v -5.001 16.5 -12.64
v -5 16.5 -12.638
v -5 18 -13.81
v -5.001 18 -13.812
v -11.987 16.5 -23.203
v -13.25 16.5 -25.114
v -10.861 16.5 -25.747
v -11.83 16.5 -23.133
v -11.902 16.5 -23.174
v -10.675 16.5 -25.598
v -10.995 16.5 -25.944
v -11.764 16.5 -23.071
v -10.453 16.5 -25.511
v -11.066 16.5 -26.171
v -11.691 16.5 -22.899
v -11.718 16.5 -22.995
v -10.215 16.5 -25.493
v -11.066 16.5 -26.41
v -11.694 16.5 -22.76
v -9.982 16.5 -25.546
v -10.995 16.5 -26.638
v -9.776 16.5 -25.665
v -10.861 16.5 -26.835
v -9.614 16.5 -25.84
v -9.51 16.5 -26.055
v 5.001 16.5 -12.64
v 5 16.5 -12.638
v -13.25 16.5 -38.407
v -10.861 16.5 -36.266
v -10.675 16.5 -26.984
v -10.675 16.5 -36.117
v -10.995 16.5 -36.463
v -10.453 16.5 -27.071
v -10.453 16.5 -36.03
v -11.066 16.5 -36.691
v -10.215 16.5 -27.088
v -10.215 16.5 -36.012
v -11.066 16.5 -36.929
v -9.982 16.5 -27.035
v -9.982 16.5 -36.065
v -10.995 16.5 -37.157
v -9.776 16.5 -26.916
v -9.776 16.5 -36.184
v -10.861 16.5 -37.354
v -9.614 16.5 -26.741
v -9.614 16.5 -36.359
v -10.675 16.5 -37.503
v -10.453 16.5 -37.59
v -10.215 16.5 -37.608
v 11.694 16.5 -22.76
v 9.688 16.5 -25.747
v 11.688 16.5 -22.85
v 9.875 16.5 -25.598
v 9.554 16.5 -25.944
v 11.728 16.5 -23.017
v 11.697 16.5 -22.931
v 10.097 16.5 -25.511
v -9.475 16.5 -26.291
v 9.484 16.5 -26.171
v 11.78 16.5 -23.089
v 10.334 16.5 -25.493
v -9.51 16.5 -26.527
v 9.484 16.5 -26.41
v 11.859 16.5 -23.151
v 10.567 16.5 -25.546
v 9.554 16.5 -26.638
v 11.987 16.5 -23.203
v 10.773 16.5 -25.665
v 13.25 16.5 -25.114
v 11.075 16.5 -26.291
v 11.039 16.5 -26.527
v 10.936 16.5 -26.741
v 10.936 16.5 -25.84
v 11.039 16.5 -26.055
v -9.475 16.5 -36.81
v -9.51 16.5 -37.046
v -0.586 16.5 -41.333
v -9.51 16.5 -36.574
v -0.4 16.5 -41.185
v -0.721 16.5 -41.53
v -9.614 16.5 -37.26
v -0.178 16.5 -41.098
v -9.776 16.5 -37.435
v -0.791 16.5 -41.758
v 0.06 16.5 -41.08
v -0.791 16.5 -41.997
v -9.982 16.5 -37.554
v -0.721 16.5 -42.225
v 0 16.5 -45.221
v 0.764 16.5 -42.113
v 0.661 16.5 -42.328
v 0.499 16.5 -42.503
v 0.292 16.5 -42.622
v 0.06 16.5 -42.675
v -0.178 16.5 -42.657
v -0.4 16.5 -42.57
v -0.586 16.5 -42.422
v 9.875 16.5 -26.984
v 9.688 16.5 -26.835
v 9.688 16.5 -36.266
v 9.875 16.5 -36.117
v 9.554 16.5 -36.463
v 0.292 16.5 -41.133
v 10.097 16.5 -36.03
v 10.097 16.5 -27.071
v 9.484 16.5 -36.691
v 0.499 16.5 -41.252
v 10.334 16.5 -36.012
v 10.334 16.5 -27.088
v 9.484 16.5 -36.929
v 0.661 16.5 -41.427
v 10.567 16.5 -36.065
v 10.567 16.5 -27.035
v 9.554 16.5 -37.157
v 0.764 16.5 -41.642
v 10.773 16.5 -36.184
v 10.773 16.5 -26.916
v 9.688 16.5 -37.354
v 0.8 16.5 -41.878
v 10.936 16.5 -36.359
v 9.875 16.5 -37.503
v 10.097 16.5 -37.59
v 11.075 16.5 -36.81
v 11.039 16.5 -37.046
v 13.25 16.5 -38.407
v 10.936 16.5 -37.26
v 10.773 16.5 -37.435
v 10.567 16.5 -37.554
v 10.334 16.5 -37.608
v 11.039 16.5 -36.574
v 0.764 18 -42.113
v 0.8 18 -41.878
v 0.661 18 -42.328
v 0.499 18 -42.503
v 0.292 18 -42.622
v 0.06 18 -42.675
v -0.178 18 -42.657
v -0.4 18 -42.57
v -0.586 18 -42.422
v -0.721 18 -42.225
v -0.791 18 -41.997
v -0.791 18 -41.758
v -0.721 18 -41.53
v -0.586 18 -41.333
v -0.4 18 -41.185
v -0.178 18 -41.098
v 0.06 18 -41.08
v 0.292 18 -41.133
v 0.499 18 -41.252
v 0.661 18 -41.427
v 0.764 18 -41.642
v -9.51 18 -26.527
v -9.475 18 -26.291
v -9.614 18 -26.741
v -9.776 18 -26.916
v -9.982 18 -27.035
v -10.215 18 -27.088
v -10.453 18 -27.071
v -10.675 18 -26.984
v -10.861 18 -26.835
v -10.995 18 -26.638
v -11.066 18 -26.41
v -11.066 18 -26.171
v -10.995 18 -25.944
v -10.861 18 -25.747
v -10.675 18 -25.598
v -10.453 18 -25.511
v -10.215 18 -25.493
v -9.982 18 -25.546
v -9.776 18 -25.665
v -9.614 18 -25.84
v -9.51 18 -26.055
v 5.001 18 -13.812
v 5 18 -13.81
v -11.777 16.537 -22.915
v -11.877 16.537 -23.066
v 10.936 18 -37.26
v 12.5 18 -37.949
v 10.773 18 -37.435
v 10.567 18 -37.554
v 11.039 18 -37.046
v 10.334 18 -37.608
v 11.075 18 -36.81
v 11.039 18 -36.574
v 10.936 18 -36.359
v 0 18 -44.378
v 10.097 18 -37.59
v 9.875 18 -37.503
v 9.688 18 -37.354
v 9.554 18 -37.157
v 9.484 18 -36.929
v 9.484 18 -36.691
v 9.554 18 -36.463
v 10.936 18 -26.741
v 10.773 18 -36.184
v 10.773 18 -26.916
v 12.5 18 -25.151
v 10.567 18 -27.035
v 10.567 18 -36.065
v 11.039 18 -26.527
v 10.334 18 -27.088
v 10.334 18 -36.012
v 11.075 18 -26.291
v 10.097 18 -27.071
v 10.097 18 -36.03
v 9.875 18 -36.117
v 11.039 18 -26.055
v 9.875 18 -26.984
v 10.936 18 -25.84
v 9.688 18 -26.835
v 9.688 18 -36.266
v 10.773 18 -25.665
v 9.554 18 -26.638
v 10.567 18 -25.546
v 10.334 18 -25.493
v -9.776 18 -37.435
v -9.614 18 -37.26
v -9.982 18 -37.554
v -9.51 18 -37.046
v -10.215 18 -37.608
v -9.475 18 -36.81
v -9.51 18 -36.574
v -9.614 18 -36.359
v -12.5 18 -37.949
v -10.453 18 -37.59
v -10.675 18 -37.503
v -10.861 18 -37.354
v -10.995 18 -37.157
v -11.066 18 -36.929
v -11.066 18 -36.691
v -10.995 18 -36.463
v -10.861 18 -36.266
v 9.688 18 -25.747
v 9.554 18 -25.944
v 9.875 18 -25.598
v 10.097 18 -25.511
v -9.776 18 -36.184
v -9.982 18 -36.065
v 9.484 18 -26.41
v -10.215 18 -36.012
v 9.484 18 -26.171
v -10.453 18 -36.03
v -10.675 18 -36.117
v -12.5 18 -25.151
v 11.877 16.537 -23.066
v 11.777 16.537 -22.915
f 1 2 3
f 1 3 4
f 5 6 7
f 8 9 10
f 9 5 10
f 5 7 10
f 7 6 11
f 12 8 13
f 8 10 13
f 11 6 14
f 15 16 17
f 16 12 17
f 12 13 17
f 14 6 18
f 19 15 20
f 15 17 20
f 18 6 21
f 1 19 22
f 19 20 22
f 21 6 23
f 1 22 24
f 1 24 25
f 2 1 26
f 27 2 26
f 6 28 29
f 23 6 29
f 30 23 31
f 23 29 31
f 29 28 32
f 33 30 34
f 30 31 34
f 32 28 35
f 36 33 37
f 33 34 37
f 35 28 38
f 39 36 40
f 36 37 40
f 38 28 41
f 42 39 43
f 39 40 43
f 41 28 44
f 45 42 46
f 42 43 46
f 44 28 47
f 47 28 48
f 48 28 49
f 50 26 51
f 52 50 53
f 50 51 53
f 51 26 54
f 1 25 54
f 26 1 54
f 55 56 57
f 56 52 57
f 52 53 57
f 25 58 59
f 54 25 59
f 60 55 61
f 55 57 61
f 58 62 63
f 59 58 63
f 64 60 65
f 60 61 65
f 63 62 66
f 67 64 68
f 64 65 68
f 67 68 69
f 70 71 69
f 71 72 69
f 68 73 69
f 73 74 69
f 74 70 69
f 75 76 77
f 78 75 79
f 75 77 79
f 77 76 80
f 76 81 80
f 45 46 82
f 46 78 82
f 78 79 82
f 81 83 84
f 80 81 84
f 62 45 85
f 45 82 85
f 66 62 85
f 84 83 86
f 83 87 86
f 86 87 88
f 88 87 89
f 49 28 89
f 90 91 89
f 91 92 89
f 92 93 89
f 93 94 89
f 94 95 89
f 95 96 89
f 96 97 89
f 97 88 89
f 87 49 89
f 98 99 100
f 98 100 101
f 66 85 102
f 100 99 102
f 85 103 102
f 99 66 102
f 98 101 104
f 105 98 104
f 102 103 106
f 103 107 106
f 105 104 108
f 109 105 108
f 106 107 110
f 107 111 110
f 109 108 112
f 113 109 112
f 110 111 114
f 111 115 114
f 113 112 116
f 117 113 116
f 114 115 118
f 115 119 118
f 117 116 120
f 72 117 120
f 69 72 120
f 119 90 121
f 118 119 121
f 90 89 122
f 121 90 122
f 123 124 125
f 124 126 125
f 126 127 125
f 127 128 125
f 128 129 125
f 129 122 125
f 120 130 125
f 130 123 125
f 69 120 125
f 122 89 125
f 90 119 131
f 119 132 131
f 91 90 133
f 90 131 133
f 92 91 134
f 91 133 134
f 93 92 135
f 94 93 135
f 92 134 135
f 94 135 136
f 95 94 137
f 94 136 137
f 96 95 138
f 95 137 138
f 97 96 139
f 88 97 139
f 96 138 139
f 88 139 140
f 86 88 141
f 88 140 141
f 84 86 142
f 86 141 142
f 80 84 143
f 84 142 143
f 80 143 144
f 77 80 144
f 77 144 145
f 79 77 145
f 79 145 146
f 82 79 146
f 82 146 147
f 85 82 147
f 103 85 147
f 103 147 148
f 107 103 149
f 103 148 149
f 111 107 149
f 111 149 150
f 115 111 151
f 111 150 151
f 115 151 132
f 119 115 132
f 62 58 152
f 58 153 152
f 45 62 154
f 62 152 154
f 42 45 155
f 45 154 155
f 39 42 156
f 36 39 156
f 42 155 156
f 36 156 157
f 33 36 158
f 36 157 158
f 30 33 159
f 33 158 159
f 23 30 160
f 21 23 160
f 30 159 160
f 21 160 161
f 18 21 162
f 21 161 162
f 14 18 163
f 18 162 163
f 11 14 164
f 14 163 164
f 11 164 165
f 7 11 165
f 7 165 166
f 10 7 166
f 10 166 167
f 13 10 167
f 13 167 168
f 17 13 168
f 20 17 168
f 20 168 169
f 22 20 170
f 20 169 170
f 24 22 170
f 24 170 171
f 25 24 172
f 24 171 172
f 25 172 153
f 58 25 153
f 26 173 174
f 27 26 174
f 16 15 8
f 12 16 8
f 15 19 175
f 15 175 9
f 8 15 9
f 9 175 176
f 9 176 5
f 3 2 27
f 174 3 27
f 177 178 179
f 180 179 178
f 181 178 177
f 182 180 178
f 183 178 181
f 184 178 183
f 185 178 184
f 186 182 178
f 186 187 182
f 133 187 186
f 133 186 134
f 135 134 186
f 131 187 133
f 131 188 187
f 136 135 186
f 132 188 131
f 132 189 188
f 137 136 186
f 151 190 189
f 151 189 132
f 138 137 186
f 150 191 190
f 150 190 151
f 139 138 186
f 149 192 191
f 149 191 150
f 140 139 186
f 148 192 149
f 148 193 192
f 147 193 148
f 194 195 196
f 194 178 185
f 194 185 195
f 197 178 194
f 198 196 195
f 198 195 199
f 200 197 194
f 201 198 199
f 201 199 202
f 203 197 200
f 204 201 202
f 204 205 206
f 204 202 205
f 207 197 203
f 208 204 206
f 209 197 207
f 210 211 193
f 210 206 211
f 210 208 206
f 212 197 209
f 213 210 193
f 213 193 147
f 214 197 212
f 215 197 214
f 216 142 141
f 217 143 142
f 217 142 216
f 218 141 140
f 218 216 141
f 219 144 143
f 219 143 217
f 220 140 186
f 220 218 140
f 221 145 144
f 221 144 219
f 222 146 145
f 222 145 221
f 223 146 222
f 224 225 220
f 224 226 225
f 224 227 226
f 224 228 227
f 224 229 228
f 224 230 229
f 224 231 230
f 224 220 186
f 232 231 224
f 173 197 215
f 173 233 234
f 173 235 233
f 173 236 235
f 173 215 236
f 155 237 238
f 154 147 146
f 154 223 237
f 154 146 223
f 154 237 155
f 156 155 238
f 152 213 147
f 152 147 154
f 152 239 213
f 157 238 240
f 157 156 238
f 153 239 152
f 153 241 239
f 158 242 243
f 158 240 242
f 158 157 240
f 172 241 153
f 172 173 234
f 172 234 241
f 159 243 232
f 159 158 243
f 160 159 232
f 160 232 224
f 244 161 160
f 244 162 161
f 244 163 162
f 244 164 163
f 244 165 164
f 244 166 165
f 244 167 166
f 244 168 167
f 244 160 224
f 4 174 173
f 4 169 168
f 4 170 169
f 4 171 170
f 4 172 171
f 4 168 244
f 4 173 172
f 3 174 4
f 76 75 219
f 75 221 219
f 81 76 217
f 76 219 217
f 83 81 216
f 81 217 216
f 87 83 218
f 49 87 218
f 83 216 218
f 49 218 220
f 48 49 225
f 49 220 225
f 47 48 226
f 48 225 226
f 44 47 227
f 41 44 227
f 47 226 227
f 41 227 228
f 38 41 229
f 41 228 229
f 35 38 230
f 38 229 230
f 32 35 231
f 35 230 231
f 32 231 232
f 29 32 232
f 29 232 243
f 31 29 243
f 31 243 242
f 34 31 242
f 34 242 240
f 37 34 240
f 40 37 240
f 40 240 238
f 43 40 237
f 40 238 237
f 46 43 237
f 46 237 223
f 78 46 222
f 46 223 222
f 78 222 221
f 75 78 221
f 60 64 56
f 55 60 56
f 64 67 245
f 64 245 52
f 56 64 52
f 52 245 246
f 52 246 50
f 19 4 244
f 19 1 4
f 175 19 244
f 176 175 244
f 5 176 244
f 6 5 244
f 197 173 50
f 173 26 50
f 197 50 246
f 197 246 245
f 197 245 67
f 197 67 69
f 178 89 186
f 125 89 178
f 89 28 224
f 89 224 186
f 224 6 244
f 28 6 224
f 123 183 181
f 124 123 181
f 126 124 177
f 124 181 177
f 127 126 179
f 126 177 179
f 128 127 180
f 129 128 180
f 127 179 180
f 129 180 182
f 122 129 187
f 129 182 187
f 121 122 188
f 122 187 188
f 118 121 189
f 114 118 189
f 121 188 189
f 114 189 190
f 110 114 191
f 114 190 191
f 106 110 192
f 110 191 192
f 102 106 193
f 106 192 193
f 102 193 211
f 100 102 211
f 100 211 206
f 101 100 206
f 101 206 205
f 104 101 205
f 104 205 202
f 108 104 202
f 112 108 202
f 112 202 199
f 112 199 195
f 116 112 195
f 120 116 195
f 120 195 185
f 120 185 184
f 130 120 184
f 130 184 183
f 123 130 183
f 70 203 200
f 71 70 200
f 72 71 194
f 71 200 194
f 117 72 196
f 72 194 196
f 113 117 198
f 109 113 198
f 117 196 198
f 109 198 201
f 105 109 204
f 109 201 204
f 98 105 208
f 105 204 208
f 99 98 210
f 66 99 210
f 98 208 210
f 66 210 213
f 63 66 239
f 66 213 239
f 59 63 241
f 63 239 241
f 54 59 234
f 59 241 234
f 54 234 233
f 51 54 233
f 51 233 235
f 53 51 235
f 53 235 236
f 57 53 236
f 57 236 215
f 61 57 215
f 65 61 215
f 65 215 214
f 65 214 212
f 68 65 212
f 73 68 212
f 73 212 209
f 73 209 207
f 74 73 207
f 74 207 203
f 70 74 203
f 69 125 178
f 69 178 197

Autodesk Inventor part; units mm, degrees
sketch "スケッチ1" plane through (0, 0, 0) normal (0, 1, 0) x (-1, 0, 0)
  line L0 (-17.5, -21) -> (0, 0)
  line L1 (0, 0) -> (17.5, -21)
  line L2 (17.5, -21) -> (17.5, -41)
  line L3 (17.5, -41) -> (0, -50)
  line L4 (0, -50) -> (-17.5, -41)
  line L5 (-17.5, -41) -> (-17.5, -21)
  line L6 (0, -60) -> (0, 10) projected
  line L7 (24.5, 0) -> (-24.5, 0) projected
  dimension "d0" = 50
  dimension "d12" = 35
  dimension "d13" = 20
  dimension "d14" = 21
extrude "押し出し1" add sketch "スケッチ1" along normal blind 18
chamfer "面取り1" distance 5 distance2 10 6 edges at (8.75, 18, -10.5) (17.5, 18, -31) (8.75, 18, -45.5) (-8.75, 18, -45.5) (-17.5, 18, -31) (-8.75, 18, -10.5) measured on face at (0, 18, -30.6667)
extrude "押し出し2" add sketch "スケッチ1" against normal blind 5
ref_plane "作業平面1" through (0, 8, 0) normal (0, -0.7881, 0.6155) x (1, 0, 0)
sketch "スケッチ2" plane through (0, 8, 0) normal (0, -0.7881, 0.6155) x (1, 0, 0)
  line L0 (0, 0) -> (17.5, -16.5503) projected
  line L1 (-17.5, -16.5503) -> (0, 0) projected
  line L2 (-5, -4.7287) -> (-5, -4.7287)
  line L3 (-5, -4.7287) -> (5, -4.7287)
  line L4 (13.3346, -12.611) -> (5, -4.7287)
  line L5 (-5, -4.7287) -> (-23.6413, -26.9446)
  line L6 (5, -4.7287) -> (18.7173, -21.0763)
  line L7 (-23.6413, -26.9446) -> (-26.2109, -24.7885)
  line L8 (-26.2109, -24.7885) -> (-17.5, -16.5503)
  line L9 (17.5, -16.5503) -> (23.8178, -21.8516)
  line L10 (23.8178, -21.8516) -> (18.7173, -21.0763)
  point P0 (0, -4.9243)
  dimension "d9" = 10
  dimension "d25" = 130
  dimension "d26" = 130
extrude "押し出し3" cut sketch "スケッチ2" against normal through all
chamfer "面取り2" distance 2 distance2 8 6 edges at (-8.75, -5, -10.5) (-17.5, -5, -31) (-8.75, -5, -45.5) (8.75, -5, -45.5) (17.5, -5, -31) (8.75, -5, -10.5) measured on face at (0, -5, -30.6667)
sketch "スケッチ3" plane through (0, -5, 0) normal (0, -1, 0) x (1, 0, 0)
  line L0 (0, -3.1241) -> (15.5, -21.7241) projected
  line L1 (-15.5, -21.7241) -> (0, -3.1241) projected
  line L2 (-15.5, -39.7796) -> (-15.5, -21.7241) projected
  line L3 (0, -47.751) -> (-15.5, -39.7796) projected
  line L4 (15.5, -39.7796) -> (0, -47.751) projected
  line L5 (15.5, -21.7241) -> (15.5, -39.7796) projected
  point P0 (0, 0)
extrude "押し出し4" add sketch "スケッチ3" along normal blind 8
ref_plane "作業平面2" through (0, -5, -3.1241) normal (0, -0.977, 0.2132) x (-0.3818, -0.1971, -0.903)
sketch "スケッチ4" plane through (0, -5, -3.1241) normal (0, -0.977, 0.2132) x (-0.3818, -0.1971, -0.903)
  line L0 (80, -28.4848) -> (-10, -28.4848)
  line L1 (-10, -28.4848) -> (-10, 40)
  line L2 (-10, 40) -> (80, 40)
  line L3 (80, 40) -> (80, -28.4848)
  point P0 (-3.8064, -1.5725)
extrude "押し出し5" cut sketch "スケッチ4" along normal through all
ref_plane "作業平面3" through (-5, 8, -6) normal (0, 0, 1) x (1, 0, 0)
sketch "スケッチ5" plane through (-5, 8, -6) normal (0, 0, 1) x (1, 0, 0)
  line L0 (-30, 20) -> (40, 20)
  line L1 (40, 20) -> (40, -30)
  line L2 (40, -30) -> (-30, -30)
  line L3 (-30, -30) -> (-30, 20)
  point P0 (5, -8)
extrude "押し出し6" cut sketch "スケッチ5" along normal through all
sketch "スケッチ6" plane through (-5, 8, -6) normal (0, 0, 1) x (1, 0, 0)
  line L0 (0, 0) -> (10, 0) projected
  circle A0 centre (5, 0) radius 5
  line L1 (9.9497, -4.9497) -> (5, -7)
  line L2 (5, -7) -> (0.0503, -4.9497)
  line L3 (0.0503, -4.9497) -> (-2, 0)
  line L4 (-2, 0) -> (0.0503, 4.9497)
  line L5 (0.0503, 4.9497) -> (5, 7)
  line L6 (5, 7) -> (9.9497, 4.9497)
  line L7 (9.9497, 4.9497) -> (12, 0)
  line L8 (12, 0) -> (9.9497, -4.9497)
  point P0 (5, -8)
  dimension "d29" = 7
extrude "押し出し7" cut sketch "スケッチ6" against normal blind 8 contours A0 L0 | L0 A0 | L1 L2 L3 L4 L5 L6 L7 L8
sketch "スケッチ8" plane through (-5, 8, -14) normal (0, 0, 1) x (1, 0, 0)
  line L0 (5, 0) -> (-12.5, 0) projected
  circle A0 centre (5, 0) radius 4
  line L1 (5, 4) -> (5, -4)
  line L2 (5, -5) -> (5, 0) projected
  point P0 (5, -8)
  dimension "d32" = 8
revolve "回転1" add sketch "スケッチ8" angle 360 about axis through (0, 12, -14) along (0, -1, 0) contours L1 A0
sketch "スケッチ9" plane through (-15.5, -5, -21.7241) normal (-0.7453, -0.2425, 0.6211) x (0.6214, 0.0849, 0.7789)
  circle A0 centre (10.2962, 6.6564) radius 0.8
  circle A1 centre (12.0048, 1.9574) radius 0.8
  circle A2 centre (7.081, 2.8272) radius 0.8
  circle A3 centre (2.1573, 3.697) radius 0.8
  circle A4 centre (5.3724, 7.5262) radius 0.8
  line L0 (2.1573, 3.697) -> (7.081, 2.8272) construction
  line L1 (7.081, 2.8272) -> (12.0048, 1.9574) construction
  line L2 (12.0048, 1.9574) -> (7.081, 2.8272)
  line L3 (5.3724, 7.5262) -> (10.2962, 6.6564) construction
  line L4 (10.2962, 6.6564) -> (9.5429, 2.3923) construction
  line L5 (5.3724, 7.5262) -> (4.6191, 3.2621) construction
  line L6 (10.2962, 6.6564) -> (12.0048, 1.9574) construction
  line L7 (12.0048, 1.9574) -> (11.7379, 0.4469) construction
  line L8 (12.0048, 1.9574) -> (13.2927, 2.4257) construction
  line L9 (20.3897, -1.7904) -> (19.4508, 6.57) projected
  line L10 (0, 0) -> (20.3897, -1.7904) projected
  point P0 (26.9765, 2.9875)
  dimension "d34" = 1.6
  dimension "d35" = 5
  dimension "d36" = 5
  dimension "d37" = 7.9143
  dimension "d38" = 3
extrude "押し出し8" cut sketch "スケッチ9" against normal blind 5
sketch "スケッチ10" plane through (-12.5, 18, -25.1515) normal (-0.766, 0.3957, 0.5066) x (0.5516, 0, 0.8341)
  circle A0 centre (2.1738, -2.388) radius 0.8 projected
  circle A1 centre (0.2082, -6.8935) radius 0.8 projected
  point P0 (27.8741, -17.8951)
extrude "押し出し9" cut sketch "スケッチ10" against normal blind 5
mirror "ミラー1" about plane through (0, 0, 0) normal (1, 0, 0) of "押し出し8", "押し出し9"
sketch "スケッチ11" plane through (0, -5, -3.1241) normal (0, -0.977, 0.2132) x (0.9242, -0.0814, -0.373)
  line L0 (3.339, -1.8055) -> (-1.091, -3.6357) projected
  line L1 (-7.0564, -23.5137) -> (-1.091, -3.6357) projected
  line L2 (0, -40.594) -> (-7.0564, -23.5137) projected
  line L3 (28.6512, -28.7573) -> (0, -40.594) projected
  line L4 (21.5948, -11.677) -> (28.6512, -28.7573) projected
  line L5 (3.339, -1.8055) -> (21.5948, -11.677) projected
  line L6 (0, -40.594) -> (21.5948, -11.677)
  line L7 (-7.0564, -23.5137) -> (28.6512, -28.7573)
  circle A0 centre (10.7974, -26.1355) radius 4.25
  point P0 (-1.5725, 3.8064)
  dimension "d43" = 8.5
ref_plane "作業平面4" through (0, -10.0527, -30.9651) normal (0, -0.977, 0.2132) x (1, 0, 0)
ref_plane "作業平面5" through (0, 16.5, 0) normal (0, 1, 0) x (1, 0, 0)
sketch "スケッチ15" plane through (0, 16.5, 0) normal (0, 1, 0) x (1, 0, 0)
  line L0 (-40, 60) -> (40, 60)
  line L1 (40, 60) -> (40, 0)
  line L2 (40, 0) -> (-40, 0)
  line L3 (-40, 0) -> (-40, 60)
  point P0 (0, 0)
extrude "押し出し15" cut sketch "スケッチ15" against normal through all
sketch "スケッチ16" plane through (0, 18, 0) normal (0, 1, 0) x (1, 0, 0)
  circle A0 centre (0, 41.8775) radius 0.8
  line L0 (-12.5, 37.949) -> (0, 44.3775) projected
  line L1 (-12.5, 25.1515) -> (-12.5, 37.949) projected
  line L2 (0, 44.3775) -> (12.5, 37.949) projected
  circle A1 centre (-10.2746, 36.8098) radius 0.8
  circle A2 centre (-10.2746, 26.2907) radius 0.8
  circle A3 centre (10.2746, 36.8098) radius 0.8
  circle A4 centre (10.2746, 26.2907) radius 0.8
  line L3 (0, 44.3775) -> (0, 41.0775) construction
  line L4 (12.5, 37.949) -> (9.5625, 36.4453) construction
  line L5 (-9.5625, 26.6552) -> (-12.5, 25.1515) construction
  line L6 (-12.5, 37.949) -> (-9.5625, 36.4453) construction
  line L7 (9.5625, 26.6552) -> (12.5, 25.1515) construction
  point P0 (0, 0)
  dimension "d65" = 1.6
  dimension "d66" = 1.6
  dimension "d67" = 1.6
  dimension "d68" = 1.6
  dimension "d69" = 1.6
  dimension "d70" = 2.5
extrude "押し出し16" cut sketch "スケッチ16" against normal through all
properties part number "head_bace_div_upper"
